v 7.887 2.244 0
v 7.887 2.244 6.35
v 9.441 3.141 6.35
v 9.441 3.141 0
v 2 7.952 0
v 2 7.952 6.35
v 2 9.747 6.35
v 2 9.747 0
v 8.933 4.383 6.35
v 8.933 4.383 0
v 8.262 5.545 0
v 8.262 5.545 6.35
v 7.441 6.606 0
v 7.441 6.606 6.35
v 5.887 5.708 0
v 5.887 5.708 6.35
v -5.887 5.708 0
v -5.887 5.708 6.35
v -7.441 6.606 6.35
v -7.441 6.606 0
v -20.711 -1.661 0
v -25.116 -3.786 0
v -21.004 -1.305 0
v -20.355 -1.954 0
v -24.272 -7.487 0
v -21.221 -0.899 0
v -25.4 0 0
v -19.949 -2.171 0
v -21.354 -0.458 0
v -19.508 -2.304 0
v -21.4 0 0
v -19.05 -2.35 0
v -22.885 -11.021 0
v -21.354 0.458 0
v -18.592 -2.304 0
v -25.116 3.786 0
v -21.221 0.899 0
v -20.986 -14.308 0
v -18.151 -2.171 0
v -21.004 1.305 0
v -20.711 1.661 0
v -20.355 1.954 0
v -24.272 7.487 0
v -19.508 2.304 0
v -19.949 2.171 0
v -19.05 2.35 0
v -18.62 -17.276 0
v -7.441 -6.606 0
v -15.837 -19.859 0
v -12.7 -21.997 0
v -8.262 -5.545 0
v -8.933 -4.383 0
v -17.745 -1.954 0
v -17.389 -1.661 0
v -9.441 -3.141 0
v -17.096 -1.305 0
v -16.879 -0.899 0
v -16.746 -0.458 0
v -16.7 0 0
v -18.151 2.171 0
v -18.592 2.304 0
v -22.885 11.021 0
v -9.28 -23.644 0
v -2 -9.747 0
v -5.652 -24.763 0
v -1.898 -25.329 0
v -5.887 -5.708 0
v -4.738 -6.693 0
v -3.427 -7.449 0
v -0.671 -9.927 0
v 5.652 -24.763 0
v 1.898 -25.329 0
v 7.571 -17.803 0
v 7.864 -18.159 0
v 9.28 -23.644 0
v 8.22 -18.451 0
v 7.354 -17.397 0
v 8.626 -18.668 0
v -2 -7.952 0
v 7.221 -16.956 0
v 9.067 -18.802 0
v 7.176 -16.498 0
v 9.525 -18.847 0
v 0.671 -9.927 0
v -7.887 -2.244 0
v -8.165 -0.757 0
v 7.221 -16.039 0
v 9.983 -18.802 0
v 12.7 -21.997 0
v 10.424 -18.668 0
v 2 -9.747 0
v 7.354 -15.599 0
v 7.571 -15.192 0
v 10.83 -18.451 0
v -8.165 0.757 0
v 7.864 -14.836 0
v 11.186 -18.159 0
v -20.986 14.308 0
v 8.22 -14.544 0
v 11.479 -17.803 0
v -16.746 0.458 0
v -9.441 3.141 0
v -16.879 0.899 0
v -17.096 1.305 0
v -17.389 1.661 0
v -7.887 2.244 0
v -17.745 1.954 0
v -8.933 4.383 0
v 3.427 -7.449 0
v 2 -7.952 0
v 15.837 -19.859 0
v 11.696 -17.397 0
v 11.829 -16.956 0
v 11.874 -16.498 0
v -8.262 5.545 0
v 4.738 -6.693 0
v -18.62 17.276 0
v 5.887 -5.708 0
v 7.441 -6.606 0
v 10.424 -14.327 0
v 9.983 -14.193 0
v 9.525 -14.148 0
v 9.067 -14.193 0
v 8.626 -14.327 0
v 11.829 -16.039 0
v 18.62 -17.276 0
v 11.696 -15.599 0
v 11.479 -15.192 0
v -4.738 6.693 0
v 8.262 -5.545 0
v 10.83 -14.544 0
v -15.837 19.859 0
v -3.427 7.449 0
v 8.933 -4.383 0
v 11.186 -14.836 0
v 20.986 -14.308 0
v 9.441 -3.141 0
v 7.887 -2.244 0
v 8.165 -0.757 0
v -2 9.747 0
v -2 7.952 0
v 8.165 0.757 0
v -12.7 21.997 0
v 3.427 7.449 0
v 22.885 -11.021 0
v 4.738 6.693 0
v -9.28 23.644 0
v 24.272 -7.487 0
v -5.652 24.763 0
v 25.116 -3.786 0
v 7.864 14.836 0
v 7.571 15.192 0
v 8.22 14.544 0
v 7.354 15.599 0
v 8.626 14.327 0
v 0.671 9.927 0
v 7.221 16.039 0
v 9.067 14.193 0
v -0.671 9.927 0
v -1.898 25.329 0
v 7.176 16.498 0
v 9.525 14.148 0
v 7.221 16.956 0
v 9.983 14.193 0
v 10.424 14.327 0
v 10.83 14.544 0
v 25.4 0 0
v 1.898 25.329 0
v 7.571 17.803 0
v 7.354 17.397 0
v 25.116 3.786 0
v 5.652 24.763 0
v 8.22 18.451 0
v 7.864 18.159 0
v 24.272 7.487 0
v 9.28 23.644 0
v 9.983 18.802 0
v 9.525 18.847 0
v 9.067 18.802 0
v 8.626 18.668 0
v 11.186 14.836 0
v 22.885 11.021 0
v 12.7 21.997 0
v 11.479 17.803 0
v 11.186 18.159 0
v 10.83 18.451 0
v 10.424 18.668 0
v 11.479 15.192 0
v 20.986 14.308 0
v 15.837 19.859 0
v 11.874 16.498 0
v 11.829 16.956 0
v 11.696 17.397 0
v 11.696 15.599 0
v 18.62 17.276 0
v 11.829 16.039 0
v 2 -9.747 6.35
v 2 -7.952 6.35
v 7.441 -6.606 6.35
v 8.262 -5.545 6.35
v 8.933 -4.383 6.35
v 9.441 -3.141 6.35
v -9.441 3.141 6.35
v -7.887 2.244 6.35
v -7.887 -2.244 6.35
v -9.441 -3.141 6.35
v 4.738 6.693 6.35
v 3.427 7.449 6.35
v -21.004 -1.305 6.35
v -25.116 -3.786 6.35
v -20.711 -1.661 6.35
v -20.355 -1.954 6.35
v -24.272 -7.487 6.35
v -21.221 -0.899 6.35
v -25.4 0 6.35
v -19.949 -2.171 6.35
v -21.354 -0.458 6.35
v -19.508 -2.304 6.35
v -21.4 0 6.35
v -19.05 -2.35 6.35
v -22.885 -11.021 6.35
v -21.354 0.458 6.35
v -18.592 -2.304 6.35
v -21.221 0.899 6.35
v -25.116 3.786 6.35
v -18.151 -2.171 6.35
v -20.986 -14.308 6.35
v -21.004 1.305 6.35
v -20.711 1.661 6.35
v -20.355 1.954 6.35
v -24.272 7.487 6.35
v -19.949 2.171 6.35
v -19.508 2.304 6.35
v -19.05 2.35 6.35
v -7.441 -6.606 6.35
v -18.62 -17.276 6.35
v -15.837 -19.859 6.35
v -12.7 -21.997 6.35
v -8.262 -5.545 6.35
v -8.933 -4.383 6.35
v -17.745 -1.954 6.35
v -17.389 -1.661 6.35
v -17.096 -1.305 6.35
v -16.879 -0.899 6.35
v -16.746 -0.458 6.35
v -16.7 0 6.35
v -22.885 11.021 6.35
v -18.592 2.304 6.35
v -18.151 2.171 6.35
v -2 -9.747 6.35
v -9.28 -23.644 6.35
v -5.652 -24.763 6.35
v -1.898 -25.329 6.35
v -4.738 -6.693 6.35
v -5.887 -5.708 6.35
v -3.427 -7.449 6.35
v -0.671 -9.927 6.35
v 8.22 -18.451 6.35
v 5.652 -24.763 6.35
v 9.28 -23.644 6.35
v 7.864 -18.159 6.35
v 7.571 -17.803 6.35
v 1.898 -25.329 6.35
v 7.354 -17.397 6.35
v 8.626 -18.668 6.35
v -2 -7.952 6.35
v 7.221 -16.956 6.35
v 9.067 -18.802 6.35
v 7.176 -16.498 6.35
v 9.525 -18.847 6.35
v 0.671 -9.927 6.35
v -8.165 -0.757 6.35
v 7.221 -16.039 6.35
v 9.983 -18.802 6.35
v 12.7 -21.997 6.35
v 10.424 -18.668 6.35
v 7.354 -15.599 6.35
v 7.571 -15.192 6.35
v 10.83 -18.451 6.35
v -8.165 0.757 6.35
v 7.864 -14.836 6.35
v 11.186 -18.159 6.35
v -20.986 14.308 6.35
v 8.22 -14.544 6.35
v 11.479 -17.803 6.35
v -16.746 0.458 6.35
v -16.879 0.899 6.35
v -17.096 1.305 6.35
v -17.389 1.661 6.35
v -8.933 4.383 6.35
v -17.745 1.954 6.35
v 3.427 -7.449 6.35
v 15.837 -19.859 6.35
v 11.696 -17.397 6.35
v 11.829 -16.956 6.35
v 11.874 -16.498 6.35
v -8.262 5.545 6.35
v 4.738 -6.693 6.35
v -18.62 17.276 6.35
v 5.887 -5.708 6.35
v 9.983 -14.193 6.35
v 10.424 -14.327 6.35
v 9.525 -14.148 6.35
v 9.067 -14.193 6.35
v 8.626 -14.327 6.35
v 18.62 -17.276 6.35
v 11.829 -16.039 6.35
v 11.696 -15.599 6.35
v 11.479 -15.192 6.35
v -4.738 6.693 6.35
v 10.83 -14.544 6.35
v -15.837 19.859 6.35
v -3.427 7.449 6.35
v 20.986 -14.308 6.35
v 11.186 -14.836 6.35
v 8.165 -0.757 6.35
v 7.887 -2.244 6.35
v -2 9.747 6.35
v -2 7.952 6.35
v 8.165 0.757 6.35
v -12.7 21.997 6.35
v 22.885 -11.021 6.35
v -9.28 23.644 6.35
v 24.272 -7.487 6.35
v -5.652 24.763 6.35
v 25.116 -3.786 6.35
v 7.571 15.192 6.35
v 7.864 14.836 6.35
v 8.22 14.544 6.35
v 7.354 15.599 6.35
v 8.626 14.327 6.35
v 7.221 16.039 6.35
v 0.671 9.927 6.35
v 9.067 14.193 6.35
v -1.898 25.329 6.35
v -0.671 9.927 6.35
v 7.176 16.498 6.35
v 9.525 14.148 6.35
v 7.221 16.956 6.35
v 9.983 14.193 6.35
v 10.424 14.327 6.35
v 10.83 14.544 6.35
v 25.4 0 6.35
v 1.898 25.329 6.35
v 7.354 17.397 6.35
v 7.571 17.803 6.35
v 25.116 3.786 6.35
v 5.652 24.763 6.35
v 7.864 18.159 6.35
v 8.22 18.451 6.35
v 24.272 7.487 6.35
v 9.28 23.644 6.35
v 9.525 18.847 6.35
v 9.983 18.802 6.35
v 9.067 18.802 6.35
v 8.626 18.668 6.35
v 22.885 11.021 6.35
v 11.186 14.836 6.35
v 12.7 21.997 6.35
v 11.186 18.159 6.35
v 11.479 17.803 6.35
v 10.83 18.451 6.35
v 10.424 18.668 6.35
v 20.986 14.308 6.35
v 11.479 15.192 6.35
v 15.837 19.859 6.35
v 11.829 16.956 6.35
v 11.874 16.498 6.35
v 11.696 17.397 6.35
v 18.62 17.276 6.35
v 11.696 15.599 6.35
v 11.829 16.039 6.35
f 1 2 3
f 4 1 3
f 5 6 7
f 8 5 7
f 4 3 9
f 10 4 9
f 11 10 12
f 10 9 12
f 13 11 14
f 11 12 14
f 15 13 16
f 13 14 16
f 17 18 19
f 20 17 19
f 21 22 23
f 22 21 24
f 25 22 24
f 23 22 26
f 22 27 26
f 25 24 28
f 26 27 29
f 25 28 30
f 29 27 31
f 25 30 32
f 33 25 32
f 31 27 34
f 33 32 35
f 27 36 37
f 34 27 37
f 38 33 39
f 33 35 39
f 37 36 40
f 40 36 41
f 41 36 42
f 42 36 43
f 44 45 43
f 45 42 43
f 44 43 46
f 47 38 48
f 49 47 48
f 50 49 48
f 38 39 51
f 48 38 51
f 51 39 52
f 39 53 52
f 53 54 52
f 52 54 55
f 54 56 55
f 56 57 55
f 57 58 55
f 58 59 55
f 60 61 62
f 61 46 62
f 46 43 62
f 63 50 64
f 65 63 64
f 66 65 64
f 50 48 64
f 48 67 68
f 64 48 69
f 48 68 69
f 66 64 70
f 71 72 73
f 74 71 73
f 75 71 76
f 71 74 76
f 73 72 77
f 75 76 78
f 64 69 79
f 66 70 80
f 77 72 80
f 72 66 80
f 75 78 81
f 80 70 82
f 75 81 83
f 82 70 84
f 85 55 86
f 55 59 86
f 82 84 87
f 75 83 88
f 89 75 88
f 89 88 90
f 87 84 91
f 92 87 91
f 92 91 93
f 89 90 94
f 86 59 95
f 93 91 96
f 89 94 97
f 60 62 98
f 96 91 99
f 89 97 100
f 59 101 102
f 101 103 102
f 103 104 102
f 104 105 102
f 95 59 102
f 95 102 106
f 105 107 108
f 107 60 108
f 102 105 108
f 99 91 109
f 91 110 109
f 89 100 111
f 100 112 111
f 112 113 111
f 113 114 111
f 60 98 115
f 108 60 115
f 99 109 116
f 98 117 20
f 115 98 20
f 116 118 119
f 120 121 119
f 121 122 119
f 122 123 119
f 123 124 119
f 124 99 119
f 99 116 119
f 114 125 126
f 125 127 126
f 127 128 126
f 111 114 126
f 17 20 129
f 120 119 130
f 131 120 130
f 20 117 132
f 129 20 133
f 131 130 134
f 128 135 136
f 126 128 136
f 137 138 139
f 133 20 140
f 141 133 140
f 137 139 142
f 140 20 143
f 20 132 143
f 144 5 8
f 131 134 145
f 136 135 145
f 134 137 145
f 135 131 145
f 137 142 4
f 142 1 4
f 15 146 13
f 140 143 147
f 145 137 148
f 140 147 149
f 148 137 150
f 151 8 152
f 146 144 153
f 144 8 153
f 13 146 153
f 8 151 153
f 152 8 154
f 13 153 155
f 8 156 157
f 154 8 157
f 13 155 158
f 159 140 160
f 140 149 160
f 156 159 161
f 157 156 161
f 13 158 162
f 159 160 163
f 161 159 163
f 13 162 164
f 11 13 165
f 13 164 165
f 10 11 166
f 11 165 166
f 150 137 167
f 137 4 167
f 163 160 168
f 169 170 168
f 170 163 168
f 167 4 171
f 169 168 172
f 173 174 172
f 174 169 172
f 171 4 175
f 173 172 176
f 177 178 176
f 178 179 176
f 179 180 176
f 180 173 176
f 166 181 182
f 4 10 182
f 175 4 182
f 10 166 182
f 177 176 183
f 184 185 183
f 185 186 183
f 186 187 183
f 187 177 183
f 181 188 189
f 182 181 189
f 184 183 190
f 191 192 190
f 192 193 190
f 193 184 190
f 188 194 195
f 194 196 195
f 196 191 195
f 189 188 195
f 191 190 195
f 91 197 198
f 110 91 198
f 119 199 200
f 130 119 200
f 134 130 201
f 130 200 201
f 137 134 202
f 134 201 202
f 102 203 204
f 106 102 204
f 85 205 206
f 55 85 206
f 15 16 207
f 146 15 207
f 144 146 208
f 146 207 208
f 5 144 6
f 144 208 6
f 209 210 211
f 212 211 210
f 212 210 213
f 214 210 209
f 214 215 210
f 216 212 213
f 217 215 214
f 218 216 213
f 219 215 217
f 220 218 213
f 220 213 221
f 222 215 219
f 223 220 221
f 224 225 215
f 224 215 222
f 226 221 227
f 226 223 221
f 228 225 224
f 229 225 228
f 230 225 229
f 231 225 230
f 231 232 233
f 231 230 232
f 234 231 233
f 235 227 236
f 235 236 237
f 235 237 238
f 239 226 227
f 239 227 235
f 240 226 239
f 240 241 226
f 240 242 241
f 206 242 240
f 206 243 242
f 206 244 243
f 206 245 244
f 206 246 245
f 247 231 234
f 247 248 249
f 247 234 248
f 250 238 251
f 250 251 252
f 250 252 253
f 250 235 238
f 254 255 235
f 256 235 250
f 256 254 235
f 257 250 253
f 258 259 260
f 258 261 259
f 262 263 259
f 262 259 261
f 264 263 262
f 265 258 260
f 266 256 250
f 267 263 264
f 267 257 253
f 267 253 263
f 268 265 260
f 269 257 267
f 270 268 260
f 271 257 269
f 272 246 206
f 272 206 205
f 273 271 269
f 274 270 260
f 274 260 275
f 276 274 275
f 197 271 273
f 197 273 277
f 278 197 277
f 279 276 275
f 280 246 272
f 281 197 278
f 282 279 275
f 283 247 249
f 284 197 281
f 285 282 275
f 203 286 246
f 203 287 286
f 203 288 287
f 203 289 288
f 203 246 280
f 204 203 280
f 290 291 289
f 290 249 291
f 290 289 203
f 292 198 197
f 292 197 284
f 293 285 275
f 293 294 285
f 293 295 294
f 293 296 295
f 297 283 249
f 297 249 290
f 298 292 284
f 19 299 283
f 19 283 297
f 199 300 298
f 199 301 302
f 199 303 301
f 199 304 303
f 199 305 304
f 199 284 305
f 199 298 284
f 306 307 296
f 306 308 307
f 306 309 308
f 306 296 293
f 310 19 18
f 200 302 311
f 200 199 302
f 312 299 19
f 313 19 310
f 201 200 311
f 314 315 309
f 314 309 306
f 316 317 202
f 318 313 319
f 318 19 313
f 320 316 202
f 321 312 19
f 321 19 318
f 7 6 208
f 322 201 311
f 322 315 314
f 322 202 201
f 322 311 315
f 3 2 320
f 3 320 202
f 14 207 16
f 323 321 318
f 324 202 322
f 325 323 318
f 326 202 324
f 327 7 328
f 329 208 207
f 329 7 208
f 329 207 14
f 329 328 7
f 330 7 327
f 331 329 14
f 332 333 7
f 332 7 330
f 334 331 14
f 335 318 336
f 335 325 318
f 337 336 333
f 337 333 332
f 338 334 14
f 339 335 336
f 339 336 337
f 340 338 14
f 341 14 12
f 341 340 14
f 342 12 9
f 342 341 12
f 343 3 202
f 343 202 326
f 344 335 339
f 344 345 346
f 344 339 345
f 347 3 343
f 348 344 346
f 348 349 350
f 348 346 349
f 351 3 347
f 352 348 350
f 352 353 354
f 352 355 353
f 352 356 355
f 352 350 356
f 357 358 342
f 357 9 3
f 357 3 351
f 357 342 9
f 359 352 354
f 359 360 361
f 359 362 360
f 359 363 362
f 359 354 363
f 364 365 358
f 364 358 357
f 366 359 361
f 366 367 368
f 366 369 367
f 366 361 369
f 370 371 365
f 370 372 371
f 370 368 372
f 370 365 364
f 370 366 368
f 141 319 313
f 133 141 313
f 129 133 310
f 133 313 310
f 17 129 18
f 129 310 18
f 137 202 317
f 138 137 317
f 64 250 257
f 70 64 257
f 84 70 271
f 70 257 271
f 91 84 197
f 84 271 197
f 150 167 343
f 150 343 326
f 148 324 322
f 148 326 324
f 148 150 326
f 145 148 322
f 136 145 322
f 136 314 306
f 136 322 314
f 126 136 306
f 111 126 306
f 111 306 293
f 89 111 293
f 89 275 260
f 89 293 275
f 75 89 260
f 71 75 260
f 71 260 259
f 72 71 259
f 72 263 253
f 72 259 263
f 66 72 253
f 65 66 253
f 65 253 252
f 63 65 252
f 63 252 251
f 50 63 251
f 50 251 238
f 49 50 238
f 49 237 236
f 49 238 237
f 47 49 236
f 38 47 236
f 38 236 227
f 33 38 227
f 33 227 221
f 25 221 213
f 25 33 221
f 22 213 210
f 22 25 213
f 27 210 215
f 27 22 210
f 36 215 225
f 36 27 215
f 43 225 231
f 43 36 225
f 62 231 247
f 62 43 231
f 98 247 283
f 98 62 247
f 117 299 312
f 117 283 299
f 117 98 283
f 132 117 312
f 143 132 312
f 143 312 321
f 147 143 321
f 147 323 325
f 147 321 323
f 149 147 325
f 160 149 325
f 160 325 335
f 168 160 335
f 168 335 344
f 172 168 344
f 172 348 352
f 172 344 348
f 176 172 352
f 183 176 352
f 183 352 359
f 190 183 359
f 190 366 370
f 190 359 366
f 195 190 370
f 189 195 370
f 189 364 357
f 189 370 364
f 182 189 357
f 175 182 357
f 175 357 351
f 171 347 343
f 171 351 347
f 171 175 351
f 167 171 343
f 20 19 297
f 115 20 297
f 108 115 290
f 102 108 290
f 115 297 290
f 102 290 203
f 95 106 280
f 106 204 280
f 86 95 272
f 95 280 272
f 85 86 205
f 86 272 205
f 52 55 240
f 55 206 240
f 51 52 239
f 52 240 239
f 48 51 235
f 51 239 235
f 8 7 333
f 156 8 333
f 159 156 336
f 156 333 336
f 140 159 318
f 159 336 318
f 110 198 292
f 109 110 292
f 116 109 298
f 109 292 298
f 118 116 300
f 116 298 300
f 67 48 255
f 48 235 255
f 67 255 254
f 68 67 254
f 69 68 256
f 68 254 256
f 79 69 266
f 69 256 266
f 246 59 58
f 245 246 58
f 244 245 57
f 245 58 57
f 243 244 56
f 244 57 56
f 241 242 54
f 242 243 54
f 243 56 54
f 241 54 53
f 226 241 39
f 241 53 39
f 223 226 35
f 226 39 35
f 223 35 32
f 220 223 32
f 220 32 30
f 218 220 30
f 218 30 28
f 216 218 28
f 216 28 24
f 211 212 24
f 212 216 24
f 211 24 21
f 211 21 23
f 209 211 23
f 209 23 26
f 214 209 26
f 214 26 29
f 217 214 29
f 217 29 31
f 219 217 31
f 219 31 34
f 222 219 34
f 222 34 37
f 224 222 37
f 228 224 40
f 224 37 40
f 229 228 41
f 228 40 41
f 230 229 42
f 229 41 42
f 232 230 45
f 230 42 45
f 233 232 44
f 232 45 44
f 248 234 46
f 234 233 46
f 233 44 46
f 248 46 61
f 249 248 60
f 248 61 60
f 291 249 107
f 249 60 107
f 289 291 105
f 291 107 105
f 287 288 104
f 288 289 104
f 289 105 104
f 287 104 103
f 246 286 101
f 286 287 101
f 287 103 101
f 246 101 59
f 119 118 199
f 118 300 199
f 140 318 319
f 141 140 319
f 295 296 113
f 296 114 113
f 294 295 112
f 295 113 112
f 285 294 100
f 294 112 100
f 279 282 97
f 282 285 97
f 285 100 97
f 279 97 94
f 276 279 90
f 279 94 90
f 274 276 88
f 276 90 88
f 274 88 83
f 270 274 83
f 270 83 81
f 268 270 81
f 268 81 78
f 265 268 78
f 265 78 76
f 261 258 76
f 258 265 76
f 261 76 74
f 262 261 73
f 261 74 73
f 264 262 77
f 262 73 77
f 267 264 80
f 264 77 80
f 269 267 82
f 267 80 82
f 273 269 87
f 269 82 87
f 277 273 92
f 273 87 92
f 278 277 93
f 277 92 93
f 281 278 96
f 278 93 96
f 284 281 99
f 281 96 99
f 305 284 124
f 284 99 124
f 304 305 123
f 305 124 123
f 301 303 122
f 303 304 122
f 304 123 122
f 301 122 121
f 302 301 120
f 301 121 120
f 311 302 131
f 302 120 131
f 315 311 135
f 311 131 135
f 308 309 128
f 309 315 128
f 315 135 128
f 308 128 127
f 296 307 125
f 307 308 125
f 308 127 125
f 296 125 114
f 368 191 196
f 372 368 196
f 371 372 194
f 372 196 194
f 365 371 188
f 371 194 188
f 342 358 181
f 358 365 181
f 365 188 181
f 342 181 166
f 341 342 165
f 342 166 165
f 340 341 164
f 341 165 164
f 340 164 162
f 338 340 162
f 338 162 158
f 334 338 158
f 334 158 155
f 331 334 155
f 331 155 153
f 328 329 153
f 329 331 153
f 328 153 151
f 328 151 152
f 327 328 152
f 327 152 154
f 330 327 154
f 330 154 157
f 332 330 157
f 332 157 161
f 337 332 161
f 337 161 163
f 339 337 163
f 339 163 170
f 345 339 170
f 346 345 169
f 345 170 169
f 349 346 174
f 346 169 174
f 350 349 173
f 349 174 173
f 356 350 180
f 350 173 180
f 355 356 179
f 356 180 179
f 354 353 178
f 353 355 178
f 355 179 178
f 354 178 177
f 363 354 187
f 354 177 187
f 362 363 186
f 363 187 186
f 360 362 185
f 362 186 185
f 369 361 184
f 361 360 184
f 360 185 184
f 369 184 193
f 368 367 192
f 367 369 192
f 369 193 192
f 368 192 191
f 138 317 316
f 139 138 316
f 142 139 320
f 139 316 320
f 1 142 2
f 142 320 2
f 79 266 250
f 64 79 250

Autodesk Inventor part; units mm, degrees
ref_plane "YZ Plane" through (0, 0, 0) normal (1, 0, 0) x (0, 1, 0)
ref_plane "XZ Plane" through (0, 0, 0) normal (0, 1, 0) x (-1, 0, 0)
ref_plane "XY Plane" through (0, 0, 0) normal (0, 0, 1) x (1, 0, 0)
sketch "Sketch1" plane through (0, 0, 0) normal (0, 0, 1) x (1, 0, 0)
  circle A0 centre (0, 0) radius 25.4
  circle A1 centre (-19.05, 0) radius 2.3495
  circle A2 centre (9.525, -16.4978) radius 2.3495
  circle A3 centre (9.525, 16.4978) radius 2.3495
  line L0 (-19.05, 0) -> (0, 0) construction
  dimension "d0" = 50.8
  dimension "d3" = 4.699
  dimension "d6" = 360
  dimension "d8" = 19.05
extrude "Extrusion1" add sketch "Sketch1" along normal blind 6.35
sketch "Sketch2" plane through (0, 0, 6.35) normal (0, 0, 1) x (1, 0, 0)
  arc A0 (2, 7.9524) -> (-2, 7.9524) centre (0, 0) ccw projected
  arc A1 (-2, 7.9524) -> (-5.8869, 5.7082) centre (0, 0) ccw projected
  arc A2 (-5.8869, 5.7082) -> (-7.8869, 2.2441) centre (0, 0) ccw projected
  arc A3 (-7.8869, 2.2441) -> (-7.8869, -2.2441) centre (0, 0) ccw projected
  arc A4 (-7.8869, -2.2441) -> (-5.8869, -5.7082) centre (0, 0) ccw projected
  arc A5 (-5.8869, -5.7082) -> (-2, -7.9524) centre (0, 0) ccw projected
  arc A6 (-2, -7.9524) -> (2, -7.9524) centre (0, 0) ccw projected
  arc A7 (2, -7.9524) -> (5.8869, -5.7082) centre (0, 0) ccw projected
  arc A8 (5.8869, -5.7082) -> (7.8869, -2.2441) centre (0, 0) ccw projected
  arc A9 (7.8869, -2.2441) -> (7.8869, 2.2441) centre (0, 0) ccw projected
  arc A10 (7.8869, 2.2441) -> (5.8869, 5.7082) centre (0, 0) ccw projected
  arc A11 (5.8869, 5.7082) -> (2, 7.9524) centre (0, 0) ccw projected
  arc A12 (2, 9.7469) -> (-2, 9.7469) centre (0, 0) ccw projected
  line L0 (2, 7.9524) -> (2, 9.7469) projected
  line L1 (-2, 9.7469) -> (-2, 7.9524) projected
  line L2 (-5.8869, 5.7082) -> (-7.4411, 6.6055) projected
  arc A13 (-7.4411, 6.6055) -> (-9.4411, 3.1414) centre (0, 0) ccw projected
  line L3 (-9.4411, 3.1414) -> (-7.8869, 2.2441) projected
  line L4 (-7.8869, -2.2441) -> (-9.4411, -3.1414) projected
  arc A14 (-9.4411, -3.1414) -> (-7.4411, -6.6055) centre (0, 0) ccw projected
  line L5 (-7.4411, -6.6055) -> (-5.8869, -5.7082) projected
  line L6 (-2, -7.9524) -> (-2, -9.7469) projected
  arc A15 (-2, -9.7469) -> (2, -9.7469) centre (0, 0) ccw projected
  line L7 (2, -9.7469) -> (2, -7.9524) projected
  line L8 (5.8869, -5.7082) -> (7.4411, -6.6055) projected
  arc A16 (7.4411, -6.6055) -> (9.4411, -3.1414) centre (0, 0) ccw projected
  line L9 (9.4411, -3.1414) -> (7.8869, -2.2441) projected
  line L10 (7.8869, 2.2441) -> (9.4411, 3.1414) projected
  arc A17 (9.4411, 3.1414) -> (7.4411, 6.6055) centre (0, 0) ccw projected
  line L11 (7.4411, 6.6055) -> (5.8869, 5.7082) projected
extrude "Extrusion2" cut sketch "Sketch2" against normal blind 25.4
properties part number "Small Gear Spacer" material "Polycarbonate, Clear"
